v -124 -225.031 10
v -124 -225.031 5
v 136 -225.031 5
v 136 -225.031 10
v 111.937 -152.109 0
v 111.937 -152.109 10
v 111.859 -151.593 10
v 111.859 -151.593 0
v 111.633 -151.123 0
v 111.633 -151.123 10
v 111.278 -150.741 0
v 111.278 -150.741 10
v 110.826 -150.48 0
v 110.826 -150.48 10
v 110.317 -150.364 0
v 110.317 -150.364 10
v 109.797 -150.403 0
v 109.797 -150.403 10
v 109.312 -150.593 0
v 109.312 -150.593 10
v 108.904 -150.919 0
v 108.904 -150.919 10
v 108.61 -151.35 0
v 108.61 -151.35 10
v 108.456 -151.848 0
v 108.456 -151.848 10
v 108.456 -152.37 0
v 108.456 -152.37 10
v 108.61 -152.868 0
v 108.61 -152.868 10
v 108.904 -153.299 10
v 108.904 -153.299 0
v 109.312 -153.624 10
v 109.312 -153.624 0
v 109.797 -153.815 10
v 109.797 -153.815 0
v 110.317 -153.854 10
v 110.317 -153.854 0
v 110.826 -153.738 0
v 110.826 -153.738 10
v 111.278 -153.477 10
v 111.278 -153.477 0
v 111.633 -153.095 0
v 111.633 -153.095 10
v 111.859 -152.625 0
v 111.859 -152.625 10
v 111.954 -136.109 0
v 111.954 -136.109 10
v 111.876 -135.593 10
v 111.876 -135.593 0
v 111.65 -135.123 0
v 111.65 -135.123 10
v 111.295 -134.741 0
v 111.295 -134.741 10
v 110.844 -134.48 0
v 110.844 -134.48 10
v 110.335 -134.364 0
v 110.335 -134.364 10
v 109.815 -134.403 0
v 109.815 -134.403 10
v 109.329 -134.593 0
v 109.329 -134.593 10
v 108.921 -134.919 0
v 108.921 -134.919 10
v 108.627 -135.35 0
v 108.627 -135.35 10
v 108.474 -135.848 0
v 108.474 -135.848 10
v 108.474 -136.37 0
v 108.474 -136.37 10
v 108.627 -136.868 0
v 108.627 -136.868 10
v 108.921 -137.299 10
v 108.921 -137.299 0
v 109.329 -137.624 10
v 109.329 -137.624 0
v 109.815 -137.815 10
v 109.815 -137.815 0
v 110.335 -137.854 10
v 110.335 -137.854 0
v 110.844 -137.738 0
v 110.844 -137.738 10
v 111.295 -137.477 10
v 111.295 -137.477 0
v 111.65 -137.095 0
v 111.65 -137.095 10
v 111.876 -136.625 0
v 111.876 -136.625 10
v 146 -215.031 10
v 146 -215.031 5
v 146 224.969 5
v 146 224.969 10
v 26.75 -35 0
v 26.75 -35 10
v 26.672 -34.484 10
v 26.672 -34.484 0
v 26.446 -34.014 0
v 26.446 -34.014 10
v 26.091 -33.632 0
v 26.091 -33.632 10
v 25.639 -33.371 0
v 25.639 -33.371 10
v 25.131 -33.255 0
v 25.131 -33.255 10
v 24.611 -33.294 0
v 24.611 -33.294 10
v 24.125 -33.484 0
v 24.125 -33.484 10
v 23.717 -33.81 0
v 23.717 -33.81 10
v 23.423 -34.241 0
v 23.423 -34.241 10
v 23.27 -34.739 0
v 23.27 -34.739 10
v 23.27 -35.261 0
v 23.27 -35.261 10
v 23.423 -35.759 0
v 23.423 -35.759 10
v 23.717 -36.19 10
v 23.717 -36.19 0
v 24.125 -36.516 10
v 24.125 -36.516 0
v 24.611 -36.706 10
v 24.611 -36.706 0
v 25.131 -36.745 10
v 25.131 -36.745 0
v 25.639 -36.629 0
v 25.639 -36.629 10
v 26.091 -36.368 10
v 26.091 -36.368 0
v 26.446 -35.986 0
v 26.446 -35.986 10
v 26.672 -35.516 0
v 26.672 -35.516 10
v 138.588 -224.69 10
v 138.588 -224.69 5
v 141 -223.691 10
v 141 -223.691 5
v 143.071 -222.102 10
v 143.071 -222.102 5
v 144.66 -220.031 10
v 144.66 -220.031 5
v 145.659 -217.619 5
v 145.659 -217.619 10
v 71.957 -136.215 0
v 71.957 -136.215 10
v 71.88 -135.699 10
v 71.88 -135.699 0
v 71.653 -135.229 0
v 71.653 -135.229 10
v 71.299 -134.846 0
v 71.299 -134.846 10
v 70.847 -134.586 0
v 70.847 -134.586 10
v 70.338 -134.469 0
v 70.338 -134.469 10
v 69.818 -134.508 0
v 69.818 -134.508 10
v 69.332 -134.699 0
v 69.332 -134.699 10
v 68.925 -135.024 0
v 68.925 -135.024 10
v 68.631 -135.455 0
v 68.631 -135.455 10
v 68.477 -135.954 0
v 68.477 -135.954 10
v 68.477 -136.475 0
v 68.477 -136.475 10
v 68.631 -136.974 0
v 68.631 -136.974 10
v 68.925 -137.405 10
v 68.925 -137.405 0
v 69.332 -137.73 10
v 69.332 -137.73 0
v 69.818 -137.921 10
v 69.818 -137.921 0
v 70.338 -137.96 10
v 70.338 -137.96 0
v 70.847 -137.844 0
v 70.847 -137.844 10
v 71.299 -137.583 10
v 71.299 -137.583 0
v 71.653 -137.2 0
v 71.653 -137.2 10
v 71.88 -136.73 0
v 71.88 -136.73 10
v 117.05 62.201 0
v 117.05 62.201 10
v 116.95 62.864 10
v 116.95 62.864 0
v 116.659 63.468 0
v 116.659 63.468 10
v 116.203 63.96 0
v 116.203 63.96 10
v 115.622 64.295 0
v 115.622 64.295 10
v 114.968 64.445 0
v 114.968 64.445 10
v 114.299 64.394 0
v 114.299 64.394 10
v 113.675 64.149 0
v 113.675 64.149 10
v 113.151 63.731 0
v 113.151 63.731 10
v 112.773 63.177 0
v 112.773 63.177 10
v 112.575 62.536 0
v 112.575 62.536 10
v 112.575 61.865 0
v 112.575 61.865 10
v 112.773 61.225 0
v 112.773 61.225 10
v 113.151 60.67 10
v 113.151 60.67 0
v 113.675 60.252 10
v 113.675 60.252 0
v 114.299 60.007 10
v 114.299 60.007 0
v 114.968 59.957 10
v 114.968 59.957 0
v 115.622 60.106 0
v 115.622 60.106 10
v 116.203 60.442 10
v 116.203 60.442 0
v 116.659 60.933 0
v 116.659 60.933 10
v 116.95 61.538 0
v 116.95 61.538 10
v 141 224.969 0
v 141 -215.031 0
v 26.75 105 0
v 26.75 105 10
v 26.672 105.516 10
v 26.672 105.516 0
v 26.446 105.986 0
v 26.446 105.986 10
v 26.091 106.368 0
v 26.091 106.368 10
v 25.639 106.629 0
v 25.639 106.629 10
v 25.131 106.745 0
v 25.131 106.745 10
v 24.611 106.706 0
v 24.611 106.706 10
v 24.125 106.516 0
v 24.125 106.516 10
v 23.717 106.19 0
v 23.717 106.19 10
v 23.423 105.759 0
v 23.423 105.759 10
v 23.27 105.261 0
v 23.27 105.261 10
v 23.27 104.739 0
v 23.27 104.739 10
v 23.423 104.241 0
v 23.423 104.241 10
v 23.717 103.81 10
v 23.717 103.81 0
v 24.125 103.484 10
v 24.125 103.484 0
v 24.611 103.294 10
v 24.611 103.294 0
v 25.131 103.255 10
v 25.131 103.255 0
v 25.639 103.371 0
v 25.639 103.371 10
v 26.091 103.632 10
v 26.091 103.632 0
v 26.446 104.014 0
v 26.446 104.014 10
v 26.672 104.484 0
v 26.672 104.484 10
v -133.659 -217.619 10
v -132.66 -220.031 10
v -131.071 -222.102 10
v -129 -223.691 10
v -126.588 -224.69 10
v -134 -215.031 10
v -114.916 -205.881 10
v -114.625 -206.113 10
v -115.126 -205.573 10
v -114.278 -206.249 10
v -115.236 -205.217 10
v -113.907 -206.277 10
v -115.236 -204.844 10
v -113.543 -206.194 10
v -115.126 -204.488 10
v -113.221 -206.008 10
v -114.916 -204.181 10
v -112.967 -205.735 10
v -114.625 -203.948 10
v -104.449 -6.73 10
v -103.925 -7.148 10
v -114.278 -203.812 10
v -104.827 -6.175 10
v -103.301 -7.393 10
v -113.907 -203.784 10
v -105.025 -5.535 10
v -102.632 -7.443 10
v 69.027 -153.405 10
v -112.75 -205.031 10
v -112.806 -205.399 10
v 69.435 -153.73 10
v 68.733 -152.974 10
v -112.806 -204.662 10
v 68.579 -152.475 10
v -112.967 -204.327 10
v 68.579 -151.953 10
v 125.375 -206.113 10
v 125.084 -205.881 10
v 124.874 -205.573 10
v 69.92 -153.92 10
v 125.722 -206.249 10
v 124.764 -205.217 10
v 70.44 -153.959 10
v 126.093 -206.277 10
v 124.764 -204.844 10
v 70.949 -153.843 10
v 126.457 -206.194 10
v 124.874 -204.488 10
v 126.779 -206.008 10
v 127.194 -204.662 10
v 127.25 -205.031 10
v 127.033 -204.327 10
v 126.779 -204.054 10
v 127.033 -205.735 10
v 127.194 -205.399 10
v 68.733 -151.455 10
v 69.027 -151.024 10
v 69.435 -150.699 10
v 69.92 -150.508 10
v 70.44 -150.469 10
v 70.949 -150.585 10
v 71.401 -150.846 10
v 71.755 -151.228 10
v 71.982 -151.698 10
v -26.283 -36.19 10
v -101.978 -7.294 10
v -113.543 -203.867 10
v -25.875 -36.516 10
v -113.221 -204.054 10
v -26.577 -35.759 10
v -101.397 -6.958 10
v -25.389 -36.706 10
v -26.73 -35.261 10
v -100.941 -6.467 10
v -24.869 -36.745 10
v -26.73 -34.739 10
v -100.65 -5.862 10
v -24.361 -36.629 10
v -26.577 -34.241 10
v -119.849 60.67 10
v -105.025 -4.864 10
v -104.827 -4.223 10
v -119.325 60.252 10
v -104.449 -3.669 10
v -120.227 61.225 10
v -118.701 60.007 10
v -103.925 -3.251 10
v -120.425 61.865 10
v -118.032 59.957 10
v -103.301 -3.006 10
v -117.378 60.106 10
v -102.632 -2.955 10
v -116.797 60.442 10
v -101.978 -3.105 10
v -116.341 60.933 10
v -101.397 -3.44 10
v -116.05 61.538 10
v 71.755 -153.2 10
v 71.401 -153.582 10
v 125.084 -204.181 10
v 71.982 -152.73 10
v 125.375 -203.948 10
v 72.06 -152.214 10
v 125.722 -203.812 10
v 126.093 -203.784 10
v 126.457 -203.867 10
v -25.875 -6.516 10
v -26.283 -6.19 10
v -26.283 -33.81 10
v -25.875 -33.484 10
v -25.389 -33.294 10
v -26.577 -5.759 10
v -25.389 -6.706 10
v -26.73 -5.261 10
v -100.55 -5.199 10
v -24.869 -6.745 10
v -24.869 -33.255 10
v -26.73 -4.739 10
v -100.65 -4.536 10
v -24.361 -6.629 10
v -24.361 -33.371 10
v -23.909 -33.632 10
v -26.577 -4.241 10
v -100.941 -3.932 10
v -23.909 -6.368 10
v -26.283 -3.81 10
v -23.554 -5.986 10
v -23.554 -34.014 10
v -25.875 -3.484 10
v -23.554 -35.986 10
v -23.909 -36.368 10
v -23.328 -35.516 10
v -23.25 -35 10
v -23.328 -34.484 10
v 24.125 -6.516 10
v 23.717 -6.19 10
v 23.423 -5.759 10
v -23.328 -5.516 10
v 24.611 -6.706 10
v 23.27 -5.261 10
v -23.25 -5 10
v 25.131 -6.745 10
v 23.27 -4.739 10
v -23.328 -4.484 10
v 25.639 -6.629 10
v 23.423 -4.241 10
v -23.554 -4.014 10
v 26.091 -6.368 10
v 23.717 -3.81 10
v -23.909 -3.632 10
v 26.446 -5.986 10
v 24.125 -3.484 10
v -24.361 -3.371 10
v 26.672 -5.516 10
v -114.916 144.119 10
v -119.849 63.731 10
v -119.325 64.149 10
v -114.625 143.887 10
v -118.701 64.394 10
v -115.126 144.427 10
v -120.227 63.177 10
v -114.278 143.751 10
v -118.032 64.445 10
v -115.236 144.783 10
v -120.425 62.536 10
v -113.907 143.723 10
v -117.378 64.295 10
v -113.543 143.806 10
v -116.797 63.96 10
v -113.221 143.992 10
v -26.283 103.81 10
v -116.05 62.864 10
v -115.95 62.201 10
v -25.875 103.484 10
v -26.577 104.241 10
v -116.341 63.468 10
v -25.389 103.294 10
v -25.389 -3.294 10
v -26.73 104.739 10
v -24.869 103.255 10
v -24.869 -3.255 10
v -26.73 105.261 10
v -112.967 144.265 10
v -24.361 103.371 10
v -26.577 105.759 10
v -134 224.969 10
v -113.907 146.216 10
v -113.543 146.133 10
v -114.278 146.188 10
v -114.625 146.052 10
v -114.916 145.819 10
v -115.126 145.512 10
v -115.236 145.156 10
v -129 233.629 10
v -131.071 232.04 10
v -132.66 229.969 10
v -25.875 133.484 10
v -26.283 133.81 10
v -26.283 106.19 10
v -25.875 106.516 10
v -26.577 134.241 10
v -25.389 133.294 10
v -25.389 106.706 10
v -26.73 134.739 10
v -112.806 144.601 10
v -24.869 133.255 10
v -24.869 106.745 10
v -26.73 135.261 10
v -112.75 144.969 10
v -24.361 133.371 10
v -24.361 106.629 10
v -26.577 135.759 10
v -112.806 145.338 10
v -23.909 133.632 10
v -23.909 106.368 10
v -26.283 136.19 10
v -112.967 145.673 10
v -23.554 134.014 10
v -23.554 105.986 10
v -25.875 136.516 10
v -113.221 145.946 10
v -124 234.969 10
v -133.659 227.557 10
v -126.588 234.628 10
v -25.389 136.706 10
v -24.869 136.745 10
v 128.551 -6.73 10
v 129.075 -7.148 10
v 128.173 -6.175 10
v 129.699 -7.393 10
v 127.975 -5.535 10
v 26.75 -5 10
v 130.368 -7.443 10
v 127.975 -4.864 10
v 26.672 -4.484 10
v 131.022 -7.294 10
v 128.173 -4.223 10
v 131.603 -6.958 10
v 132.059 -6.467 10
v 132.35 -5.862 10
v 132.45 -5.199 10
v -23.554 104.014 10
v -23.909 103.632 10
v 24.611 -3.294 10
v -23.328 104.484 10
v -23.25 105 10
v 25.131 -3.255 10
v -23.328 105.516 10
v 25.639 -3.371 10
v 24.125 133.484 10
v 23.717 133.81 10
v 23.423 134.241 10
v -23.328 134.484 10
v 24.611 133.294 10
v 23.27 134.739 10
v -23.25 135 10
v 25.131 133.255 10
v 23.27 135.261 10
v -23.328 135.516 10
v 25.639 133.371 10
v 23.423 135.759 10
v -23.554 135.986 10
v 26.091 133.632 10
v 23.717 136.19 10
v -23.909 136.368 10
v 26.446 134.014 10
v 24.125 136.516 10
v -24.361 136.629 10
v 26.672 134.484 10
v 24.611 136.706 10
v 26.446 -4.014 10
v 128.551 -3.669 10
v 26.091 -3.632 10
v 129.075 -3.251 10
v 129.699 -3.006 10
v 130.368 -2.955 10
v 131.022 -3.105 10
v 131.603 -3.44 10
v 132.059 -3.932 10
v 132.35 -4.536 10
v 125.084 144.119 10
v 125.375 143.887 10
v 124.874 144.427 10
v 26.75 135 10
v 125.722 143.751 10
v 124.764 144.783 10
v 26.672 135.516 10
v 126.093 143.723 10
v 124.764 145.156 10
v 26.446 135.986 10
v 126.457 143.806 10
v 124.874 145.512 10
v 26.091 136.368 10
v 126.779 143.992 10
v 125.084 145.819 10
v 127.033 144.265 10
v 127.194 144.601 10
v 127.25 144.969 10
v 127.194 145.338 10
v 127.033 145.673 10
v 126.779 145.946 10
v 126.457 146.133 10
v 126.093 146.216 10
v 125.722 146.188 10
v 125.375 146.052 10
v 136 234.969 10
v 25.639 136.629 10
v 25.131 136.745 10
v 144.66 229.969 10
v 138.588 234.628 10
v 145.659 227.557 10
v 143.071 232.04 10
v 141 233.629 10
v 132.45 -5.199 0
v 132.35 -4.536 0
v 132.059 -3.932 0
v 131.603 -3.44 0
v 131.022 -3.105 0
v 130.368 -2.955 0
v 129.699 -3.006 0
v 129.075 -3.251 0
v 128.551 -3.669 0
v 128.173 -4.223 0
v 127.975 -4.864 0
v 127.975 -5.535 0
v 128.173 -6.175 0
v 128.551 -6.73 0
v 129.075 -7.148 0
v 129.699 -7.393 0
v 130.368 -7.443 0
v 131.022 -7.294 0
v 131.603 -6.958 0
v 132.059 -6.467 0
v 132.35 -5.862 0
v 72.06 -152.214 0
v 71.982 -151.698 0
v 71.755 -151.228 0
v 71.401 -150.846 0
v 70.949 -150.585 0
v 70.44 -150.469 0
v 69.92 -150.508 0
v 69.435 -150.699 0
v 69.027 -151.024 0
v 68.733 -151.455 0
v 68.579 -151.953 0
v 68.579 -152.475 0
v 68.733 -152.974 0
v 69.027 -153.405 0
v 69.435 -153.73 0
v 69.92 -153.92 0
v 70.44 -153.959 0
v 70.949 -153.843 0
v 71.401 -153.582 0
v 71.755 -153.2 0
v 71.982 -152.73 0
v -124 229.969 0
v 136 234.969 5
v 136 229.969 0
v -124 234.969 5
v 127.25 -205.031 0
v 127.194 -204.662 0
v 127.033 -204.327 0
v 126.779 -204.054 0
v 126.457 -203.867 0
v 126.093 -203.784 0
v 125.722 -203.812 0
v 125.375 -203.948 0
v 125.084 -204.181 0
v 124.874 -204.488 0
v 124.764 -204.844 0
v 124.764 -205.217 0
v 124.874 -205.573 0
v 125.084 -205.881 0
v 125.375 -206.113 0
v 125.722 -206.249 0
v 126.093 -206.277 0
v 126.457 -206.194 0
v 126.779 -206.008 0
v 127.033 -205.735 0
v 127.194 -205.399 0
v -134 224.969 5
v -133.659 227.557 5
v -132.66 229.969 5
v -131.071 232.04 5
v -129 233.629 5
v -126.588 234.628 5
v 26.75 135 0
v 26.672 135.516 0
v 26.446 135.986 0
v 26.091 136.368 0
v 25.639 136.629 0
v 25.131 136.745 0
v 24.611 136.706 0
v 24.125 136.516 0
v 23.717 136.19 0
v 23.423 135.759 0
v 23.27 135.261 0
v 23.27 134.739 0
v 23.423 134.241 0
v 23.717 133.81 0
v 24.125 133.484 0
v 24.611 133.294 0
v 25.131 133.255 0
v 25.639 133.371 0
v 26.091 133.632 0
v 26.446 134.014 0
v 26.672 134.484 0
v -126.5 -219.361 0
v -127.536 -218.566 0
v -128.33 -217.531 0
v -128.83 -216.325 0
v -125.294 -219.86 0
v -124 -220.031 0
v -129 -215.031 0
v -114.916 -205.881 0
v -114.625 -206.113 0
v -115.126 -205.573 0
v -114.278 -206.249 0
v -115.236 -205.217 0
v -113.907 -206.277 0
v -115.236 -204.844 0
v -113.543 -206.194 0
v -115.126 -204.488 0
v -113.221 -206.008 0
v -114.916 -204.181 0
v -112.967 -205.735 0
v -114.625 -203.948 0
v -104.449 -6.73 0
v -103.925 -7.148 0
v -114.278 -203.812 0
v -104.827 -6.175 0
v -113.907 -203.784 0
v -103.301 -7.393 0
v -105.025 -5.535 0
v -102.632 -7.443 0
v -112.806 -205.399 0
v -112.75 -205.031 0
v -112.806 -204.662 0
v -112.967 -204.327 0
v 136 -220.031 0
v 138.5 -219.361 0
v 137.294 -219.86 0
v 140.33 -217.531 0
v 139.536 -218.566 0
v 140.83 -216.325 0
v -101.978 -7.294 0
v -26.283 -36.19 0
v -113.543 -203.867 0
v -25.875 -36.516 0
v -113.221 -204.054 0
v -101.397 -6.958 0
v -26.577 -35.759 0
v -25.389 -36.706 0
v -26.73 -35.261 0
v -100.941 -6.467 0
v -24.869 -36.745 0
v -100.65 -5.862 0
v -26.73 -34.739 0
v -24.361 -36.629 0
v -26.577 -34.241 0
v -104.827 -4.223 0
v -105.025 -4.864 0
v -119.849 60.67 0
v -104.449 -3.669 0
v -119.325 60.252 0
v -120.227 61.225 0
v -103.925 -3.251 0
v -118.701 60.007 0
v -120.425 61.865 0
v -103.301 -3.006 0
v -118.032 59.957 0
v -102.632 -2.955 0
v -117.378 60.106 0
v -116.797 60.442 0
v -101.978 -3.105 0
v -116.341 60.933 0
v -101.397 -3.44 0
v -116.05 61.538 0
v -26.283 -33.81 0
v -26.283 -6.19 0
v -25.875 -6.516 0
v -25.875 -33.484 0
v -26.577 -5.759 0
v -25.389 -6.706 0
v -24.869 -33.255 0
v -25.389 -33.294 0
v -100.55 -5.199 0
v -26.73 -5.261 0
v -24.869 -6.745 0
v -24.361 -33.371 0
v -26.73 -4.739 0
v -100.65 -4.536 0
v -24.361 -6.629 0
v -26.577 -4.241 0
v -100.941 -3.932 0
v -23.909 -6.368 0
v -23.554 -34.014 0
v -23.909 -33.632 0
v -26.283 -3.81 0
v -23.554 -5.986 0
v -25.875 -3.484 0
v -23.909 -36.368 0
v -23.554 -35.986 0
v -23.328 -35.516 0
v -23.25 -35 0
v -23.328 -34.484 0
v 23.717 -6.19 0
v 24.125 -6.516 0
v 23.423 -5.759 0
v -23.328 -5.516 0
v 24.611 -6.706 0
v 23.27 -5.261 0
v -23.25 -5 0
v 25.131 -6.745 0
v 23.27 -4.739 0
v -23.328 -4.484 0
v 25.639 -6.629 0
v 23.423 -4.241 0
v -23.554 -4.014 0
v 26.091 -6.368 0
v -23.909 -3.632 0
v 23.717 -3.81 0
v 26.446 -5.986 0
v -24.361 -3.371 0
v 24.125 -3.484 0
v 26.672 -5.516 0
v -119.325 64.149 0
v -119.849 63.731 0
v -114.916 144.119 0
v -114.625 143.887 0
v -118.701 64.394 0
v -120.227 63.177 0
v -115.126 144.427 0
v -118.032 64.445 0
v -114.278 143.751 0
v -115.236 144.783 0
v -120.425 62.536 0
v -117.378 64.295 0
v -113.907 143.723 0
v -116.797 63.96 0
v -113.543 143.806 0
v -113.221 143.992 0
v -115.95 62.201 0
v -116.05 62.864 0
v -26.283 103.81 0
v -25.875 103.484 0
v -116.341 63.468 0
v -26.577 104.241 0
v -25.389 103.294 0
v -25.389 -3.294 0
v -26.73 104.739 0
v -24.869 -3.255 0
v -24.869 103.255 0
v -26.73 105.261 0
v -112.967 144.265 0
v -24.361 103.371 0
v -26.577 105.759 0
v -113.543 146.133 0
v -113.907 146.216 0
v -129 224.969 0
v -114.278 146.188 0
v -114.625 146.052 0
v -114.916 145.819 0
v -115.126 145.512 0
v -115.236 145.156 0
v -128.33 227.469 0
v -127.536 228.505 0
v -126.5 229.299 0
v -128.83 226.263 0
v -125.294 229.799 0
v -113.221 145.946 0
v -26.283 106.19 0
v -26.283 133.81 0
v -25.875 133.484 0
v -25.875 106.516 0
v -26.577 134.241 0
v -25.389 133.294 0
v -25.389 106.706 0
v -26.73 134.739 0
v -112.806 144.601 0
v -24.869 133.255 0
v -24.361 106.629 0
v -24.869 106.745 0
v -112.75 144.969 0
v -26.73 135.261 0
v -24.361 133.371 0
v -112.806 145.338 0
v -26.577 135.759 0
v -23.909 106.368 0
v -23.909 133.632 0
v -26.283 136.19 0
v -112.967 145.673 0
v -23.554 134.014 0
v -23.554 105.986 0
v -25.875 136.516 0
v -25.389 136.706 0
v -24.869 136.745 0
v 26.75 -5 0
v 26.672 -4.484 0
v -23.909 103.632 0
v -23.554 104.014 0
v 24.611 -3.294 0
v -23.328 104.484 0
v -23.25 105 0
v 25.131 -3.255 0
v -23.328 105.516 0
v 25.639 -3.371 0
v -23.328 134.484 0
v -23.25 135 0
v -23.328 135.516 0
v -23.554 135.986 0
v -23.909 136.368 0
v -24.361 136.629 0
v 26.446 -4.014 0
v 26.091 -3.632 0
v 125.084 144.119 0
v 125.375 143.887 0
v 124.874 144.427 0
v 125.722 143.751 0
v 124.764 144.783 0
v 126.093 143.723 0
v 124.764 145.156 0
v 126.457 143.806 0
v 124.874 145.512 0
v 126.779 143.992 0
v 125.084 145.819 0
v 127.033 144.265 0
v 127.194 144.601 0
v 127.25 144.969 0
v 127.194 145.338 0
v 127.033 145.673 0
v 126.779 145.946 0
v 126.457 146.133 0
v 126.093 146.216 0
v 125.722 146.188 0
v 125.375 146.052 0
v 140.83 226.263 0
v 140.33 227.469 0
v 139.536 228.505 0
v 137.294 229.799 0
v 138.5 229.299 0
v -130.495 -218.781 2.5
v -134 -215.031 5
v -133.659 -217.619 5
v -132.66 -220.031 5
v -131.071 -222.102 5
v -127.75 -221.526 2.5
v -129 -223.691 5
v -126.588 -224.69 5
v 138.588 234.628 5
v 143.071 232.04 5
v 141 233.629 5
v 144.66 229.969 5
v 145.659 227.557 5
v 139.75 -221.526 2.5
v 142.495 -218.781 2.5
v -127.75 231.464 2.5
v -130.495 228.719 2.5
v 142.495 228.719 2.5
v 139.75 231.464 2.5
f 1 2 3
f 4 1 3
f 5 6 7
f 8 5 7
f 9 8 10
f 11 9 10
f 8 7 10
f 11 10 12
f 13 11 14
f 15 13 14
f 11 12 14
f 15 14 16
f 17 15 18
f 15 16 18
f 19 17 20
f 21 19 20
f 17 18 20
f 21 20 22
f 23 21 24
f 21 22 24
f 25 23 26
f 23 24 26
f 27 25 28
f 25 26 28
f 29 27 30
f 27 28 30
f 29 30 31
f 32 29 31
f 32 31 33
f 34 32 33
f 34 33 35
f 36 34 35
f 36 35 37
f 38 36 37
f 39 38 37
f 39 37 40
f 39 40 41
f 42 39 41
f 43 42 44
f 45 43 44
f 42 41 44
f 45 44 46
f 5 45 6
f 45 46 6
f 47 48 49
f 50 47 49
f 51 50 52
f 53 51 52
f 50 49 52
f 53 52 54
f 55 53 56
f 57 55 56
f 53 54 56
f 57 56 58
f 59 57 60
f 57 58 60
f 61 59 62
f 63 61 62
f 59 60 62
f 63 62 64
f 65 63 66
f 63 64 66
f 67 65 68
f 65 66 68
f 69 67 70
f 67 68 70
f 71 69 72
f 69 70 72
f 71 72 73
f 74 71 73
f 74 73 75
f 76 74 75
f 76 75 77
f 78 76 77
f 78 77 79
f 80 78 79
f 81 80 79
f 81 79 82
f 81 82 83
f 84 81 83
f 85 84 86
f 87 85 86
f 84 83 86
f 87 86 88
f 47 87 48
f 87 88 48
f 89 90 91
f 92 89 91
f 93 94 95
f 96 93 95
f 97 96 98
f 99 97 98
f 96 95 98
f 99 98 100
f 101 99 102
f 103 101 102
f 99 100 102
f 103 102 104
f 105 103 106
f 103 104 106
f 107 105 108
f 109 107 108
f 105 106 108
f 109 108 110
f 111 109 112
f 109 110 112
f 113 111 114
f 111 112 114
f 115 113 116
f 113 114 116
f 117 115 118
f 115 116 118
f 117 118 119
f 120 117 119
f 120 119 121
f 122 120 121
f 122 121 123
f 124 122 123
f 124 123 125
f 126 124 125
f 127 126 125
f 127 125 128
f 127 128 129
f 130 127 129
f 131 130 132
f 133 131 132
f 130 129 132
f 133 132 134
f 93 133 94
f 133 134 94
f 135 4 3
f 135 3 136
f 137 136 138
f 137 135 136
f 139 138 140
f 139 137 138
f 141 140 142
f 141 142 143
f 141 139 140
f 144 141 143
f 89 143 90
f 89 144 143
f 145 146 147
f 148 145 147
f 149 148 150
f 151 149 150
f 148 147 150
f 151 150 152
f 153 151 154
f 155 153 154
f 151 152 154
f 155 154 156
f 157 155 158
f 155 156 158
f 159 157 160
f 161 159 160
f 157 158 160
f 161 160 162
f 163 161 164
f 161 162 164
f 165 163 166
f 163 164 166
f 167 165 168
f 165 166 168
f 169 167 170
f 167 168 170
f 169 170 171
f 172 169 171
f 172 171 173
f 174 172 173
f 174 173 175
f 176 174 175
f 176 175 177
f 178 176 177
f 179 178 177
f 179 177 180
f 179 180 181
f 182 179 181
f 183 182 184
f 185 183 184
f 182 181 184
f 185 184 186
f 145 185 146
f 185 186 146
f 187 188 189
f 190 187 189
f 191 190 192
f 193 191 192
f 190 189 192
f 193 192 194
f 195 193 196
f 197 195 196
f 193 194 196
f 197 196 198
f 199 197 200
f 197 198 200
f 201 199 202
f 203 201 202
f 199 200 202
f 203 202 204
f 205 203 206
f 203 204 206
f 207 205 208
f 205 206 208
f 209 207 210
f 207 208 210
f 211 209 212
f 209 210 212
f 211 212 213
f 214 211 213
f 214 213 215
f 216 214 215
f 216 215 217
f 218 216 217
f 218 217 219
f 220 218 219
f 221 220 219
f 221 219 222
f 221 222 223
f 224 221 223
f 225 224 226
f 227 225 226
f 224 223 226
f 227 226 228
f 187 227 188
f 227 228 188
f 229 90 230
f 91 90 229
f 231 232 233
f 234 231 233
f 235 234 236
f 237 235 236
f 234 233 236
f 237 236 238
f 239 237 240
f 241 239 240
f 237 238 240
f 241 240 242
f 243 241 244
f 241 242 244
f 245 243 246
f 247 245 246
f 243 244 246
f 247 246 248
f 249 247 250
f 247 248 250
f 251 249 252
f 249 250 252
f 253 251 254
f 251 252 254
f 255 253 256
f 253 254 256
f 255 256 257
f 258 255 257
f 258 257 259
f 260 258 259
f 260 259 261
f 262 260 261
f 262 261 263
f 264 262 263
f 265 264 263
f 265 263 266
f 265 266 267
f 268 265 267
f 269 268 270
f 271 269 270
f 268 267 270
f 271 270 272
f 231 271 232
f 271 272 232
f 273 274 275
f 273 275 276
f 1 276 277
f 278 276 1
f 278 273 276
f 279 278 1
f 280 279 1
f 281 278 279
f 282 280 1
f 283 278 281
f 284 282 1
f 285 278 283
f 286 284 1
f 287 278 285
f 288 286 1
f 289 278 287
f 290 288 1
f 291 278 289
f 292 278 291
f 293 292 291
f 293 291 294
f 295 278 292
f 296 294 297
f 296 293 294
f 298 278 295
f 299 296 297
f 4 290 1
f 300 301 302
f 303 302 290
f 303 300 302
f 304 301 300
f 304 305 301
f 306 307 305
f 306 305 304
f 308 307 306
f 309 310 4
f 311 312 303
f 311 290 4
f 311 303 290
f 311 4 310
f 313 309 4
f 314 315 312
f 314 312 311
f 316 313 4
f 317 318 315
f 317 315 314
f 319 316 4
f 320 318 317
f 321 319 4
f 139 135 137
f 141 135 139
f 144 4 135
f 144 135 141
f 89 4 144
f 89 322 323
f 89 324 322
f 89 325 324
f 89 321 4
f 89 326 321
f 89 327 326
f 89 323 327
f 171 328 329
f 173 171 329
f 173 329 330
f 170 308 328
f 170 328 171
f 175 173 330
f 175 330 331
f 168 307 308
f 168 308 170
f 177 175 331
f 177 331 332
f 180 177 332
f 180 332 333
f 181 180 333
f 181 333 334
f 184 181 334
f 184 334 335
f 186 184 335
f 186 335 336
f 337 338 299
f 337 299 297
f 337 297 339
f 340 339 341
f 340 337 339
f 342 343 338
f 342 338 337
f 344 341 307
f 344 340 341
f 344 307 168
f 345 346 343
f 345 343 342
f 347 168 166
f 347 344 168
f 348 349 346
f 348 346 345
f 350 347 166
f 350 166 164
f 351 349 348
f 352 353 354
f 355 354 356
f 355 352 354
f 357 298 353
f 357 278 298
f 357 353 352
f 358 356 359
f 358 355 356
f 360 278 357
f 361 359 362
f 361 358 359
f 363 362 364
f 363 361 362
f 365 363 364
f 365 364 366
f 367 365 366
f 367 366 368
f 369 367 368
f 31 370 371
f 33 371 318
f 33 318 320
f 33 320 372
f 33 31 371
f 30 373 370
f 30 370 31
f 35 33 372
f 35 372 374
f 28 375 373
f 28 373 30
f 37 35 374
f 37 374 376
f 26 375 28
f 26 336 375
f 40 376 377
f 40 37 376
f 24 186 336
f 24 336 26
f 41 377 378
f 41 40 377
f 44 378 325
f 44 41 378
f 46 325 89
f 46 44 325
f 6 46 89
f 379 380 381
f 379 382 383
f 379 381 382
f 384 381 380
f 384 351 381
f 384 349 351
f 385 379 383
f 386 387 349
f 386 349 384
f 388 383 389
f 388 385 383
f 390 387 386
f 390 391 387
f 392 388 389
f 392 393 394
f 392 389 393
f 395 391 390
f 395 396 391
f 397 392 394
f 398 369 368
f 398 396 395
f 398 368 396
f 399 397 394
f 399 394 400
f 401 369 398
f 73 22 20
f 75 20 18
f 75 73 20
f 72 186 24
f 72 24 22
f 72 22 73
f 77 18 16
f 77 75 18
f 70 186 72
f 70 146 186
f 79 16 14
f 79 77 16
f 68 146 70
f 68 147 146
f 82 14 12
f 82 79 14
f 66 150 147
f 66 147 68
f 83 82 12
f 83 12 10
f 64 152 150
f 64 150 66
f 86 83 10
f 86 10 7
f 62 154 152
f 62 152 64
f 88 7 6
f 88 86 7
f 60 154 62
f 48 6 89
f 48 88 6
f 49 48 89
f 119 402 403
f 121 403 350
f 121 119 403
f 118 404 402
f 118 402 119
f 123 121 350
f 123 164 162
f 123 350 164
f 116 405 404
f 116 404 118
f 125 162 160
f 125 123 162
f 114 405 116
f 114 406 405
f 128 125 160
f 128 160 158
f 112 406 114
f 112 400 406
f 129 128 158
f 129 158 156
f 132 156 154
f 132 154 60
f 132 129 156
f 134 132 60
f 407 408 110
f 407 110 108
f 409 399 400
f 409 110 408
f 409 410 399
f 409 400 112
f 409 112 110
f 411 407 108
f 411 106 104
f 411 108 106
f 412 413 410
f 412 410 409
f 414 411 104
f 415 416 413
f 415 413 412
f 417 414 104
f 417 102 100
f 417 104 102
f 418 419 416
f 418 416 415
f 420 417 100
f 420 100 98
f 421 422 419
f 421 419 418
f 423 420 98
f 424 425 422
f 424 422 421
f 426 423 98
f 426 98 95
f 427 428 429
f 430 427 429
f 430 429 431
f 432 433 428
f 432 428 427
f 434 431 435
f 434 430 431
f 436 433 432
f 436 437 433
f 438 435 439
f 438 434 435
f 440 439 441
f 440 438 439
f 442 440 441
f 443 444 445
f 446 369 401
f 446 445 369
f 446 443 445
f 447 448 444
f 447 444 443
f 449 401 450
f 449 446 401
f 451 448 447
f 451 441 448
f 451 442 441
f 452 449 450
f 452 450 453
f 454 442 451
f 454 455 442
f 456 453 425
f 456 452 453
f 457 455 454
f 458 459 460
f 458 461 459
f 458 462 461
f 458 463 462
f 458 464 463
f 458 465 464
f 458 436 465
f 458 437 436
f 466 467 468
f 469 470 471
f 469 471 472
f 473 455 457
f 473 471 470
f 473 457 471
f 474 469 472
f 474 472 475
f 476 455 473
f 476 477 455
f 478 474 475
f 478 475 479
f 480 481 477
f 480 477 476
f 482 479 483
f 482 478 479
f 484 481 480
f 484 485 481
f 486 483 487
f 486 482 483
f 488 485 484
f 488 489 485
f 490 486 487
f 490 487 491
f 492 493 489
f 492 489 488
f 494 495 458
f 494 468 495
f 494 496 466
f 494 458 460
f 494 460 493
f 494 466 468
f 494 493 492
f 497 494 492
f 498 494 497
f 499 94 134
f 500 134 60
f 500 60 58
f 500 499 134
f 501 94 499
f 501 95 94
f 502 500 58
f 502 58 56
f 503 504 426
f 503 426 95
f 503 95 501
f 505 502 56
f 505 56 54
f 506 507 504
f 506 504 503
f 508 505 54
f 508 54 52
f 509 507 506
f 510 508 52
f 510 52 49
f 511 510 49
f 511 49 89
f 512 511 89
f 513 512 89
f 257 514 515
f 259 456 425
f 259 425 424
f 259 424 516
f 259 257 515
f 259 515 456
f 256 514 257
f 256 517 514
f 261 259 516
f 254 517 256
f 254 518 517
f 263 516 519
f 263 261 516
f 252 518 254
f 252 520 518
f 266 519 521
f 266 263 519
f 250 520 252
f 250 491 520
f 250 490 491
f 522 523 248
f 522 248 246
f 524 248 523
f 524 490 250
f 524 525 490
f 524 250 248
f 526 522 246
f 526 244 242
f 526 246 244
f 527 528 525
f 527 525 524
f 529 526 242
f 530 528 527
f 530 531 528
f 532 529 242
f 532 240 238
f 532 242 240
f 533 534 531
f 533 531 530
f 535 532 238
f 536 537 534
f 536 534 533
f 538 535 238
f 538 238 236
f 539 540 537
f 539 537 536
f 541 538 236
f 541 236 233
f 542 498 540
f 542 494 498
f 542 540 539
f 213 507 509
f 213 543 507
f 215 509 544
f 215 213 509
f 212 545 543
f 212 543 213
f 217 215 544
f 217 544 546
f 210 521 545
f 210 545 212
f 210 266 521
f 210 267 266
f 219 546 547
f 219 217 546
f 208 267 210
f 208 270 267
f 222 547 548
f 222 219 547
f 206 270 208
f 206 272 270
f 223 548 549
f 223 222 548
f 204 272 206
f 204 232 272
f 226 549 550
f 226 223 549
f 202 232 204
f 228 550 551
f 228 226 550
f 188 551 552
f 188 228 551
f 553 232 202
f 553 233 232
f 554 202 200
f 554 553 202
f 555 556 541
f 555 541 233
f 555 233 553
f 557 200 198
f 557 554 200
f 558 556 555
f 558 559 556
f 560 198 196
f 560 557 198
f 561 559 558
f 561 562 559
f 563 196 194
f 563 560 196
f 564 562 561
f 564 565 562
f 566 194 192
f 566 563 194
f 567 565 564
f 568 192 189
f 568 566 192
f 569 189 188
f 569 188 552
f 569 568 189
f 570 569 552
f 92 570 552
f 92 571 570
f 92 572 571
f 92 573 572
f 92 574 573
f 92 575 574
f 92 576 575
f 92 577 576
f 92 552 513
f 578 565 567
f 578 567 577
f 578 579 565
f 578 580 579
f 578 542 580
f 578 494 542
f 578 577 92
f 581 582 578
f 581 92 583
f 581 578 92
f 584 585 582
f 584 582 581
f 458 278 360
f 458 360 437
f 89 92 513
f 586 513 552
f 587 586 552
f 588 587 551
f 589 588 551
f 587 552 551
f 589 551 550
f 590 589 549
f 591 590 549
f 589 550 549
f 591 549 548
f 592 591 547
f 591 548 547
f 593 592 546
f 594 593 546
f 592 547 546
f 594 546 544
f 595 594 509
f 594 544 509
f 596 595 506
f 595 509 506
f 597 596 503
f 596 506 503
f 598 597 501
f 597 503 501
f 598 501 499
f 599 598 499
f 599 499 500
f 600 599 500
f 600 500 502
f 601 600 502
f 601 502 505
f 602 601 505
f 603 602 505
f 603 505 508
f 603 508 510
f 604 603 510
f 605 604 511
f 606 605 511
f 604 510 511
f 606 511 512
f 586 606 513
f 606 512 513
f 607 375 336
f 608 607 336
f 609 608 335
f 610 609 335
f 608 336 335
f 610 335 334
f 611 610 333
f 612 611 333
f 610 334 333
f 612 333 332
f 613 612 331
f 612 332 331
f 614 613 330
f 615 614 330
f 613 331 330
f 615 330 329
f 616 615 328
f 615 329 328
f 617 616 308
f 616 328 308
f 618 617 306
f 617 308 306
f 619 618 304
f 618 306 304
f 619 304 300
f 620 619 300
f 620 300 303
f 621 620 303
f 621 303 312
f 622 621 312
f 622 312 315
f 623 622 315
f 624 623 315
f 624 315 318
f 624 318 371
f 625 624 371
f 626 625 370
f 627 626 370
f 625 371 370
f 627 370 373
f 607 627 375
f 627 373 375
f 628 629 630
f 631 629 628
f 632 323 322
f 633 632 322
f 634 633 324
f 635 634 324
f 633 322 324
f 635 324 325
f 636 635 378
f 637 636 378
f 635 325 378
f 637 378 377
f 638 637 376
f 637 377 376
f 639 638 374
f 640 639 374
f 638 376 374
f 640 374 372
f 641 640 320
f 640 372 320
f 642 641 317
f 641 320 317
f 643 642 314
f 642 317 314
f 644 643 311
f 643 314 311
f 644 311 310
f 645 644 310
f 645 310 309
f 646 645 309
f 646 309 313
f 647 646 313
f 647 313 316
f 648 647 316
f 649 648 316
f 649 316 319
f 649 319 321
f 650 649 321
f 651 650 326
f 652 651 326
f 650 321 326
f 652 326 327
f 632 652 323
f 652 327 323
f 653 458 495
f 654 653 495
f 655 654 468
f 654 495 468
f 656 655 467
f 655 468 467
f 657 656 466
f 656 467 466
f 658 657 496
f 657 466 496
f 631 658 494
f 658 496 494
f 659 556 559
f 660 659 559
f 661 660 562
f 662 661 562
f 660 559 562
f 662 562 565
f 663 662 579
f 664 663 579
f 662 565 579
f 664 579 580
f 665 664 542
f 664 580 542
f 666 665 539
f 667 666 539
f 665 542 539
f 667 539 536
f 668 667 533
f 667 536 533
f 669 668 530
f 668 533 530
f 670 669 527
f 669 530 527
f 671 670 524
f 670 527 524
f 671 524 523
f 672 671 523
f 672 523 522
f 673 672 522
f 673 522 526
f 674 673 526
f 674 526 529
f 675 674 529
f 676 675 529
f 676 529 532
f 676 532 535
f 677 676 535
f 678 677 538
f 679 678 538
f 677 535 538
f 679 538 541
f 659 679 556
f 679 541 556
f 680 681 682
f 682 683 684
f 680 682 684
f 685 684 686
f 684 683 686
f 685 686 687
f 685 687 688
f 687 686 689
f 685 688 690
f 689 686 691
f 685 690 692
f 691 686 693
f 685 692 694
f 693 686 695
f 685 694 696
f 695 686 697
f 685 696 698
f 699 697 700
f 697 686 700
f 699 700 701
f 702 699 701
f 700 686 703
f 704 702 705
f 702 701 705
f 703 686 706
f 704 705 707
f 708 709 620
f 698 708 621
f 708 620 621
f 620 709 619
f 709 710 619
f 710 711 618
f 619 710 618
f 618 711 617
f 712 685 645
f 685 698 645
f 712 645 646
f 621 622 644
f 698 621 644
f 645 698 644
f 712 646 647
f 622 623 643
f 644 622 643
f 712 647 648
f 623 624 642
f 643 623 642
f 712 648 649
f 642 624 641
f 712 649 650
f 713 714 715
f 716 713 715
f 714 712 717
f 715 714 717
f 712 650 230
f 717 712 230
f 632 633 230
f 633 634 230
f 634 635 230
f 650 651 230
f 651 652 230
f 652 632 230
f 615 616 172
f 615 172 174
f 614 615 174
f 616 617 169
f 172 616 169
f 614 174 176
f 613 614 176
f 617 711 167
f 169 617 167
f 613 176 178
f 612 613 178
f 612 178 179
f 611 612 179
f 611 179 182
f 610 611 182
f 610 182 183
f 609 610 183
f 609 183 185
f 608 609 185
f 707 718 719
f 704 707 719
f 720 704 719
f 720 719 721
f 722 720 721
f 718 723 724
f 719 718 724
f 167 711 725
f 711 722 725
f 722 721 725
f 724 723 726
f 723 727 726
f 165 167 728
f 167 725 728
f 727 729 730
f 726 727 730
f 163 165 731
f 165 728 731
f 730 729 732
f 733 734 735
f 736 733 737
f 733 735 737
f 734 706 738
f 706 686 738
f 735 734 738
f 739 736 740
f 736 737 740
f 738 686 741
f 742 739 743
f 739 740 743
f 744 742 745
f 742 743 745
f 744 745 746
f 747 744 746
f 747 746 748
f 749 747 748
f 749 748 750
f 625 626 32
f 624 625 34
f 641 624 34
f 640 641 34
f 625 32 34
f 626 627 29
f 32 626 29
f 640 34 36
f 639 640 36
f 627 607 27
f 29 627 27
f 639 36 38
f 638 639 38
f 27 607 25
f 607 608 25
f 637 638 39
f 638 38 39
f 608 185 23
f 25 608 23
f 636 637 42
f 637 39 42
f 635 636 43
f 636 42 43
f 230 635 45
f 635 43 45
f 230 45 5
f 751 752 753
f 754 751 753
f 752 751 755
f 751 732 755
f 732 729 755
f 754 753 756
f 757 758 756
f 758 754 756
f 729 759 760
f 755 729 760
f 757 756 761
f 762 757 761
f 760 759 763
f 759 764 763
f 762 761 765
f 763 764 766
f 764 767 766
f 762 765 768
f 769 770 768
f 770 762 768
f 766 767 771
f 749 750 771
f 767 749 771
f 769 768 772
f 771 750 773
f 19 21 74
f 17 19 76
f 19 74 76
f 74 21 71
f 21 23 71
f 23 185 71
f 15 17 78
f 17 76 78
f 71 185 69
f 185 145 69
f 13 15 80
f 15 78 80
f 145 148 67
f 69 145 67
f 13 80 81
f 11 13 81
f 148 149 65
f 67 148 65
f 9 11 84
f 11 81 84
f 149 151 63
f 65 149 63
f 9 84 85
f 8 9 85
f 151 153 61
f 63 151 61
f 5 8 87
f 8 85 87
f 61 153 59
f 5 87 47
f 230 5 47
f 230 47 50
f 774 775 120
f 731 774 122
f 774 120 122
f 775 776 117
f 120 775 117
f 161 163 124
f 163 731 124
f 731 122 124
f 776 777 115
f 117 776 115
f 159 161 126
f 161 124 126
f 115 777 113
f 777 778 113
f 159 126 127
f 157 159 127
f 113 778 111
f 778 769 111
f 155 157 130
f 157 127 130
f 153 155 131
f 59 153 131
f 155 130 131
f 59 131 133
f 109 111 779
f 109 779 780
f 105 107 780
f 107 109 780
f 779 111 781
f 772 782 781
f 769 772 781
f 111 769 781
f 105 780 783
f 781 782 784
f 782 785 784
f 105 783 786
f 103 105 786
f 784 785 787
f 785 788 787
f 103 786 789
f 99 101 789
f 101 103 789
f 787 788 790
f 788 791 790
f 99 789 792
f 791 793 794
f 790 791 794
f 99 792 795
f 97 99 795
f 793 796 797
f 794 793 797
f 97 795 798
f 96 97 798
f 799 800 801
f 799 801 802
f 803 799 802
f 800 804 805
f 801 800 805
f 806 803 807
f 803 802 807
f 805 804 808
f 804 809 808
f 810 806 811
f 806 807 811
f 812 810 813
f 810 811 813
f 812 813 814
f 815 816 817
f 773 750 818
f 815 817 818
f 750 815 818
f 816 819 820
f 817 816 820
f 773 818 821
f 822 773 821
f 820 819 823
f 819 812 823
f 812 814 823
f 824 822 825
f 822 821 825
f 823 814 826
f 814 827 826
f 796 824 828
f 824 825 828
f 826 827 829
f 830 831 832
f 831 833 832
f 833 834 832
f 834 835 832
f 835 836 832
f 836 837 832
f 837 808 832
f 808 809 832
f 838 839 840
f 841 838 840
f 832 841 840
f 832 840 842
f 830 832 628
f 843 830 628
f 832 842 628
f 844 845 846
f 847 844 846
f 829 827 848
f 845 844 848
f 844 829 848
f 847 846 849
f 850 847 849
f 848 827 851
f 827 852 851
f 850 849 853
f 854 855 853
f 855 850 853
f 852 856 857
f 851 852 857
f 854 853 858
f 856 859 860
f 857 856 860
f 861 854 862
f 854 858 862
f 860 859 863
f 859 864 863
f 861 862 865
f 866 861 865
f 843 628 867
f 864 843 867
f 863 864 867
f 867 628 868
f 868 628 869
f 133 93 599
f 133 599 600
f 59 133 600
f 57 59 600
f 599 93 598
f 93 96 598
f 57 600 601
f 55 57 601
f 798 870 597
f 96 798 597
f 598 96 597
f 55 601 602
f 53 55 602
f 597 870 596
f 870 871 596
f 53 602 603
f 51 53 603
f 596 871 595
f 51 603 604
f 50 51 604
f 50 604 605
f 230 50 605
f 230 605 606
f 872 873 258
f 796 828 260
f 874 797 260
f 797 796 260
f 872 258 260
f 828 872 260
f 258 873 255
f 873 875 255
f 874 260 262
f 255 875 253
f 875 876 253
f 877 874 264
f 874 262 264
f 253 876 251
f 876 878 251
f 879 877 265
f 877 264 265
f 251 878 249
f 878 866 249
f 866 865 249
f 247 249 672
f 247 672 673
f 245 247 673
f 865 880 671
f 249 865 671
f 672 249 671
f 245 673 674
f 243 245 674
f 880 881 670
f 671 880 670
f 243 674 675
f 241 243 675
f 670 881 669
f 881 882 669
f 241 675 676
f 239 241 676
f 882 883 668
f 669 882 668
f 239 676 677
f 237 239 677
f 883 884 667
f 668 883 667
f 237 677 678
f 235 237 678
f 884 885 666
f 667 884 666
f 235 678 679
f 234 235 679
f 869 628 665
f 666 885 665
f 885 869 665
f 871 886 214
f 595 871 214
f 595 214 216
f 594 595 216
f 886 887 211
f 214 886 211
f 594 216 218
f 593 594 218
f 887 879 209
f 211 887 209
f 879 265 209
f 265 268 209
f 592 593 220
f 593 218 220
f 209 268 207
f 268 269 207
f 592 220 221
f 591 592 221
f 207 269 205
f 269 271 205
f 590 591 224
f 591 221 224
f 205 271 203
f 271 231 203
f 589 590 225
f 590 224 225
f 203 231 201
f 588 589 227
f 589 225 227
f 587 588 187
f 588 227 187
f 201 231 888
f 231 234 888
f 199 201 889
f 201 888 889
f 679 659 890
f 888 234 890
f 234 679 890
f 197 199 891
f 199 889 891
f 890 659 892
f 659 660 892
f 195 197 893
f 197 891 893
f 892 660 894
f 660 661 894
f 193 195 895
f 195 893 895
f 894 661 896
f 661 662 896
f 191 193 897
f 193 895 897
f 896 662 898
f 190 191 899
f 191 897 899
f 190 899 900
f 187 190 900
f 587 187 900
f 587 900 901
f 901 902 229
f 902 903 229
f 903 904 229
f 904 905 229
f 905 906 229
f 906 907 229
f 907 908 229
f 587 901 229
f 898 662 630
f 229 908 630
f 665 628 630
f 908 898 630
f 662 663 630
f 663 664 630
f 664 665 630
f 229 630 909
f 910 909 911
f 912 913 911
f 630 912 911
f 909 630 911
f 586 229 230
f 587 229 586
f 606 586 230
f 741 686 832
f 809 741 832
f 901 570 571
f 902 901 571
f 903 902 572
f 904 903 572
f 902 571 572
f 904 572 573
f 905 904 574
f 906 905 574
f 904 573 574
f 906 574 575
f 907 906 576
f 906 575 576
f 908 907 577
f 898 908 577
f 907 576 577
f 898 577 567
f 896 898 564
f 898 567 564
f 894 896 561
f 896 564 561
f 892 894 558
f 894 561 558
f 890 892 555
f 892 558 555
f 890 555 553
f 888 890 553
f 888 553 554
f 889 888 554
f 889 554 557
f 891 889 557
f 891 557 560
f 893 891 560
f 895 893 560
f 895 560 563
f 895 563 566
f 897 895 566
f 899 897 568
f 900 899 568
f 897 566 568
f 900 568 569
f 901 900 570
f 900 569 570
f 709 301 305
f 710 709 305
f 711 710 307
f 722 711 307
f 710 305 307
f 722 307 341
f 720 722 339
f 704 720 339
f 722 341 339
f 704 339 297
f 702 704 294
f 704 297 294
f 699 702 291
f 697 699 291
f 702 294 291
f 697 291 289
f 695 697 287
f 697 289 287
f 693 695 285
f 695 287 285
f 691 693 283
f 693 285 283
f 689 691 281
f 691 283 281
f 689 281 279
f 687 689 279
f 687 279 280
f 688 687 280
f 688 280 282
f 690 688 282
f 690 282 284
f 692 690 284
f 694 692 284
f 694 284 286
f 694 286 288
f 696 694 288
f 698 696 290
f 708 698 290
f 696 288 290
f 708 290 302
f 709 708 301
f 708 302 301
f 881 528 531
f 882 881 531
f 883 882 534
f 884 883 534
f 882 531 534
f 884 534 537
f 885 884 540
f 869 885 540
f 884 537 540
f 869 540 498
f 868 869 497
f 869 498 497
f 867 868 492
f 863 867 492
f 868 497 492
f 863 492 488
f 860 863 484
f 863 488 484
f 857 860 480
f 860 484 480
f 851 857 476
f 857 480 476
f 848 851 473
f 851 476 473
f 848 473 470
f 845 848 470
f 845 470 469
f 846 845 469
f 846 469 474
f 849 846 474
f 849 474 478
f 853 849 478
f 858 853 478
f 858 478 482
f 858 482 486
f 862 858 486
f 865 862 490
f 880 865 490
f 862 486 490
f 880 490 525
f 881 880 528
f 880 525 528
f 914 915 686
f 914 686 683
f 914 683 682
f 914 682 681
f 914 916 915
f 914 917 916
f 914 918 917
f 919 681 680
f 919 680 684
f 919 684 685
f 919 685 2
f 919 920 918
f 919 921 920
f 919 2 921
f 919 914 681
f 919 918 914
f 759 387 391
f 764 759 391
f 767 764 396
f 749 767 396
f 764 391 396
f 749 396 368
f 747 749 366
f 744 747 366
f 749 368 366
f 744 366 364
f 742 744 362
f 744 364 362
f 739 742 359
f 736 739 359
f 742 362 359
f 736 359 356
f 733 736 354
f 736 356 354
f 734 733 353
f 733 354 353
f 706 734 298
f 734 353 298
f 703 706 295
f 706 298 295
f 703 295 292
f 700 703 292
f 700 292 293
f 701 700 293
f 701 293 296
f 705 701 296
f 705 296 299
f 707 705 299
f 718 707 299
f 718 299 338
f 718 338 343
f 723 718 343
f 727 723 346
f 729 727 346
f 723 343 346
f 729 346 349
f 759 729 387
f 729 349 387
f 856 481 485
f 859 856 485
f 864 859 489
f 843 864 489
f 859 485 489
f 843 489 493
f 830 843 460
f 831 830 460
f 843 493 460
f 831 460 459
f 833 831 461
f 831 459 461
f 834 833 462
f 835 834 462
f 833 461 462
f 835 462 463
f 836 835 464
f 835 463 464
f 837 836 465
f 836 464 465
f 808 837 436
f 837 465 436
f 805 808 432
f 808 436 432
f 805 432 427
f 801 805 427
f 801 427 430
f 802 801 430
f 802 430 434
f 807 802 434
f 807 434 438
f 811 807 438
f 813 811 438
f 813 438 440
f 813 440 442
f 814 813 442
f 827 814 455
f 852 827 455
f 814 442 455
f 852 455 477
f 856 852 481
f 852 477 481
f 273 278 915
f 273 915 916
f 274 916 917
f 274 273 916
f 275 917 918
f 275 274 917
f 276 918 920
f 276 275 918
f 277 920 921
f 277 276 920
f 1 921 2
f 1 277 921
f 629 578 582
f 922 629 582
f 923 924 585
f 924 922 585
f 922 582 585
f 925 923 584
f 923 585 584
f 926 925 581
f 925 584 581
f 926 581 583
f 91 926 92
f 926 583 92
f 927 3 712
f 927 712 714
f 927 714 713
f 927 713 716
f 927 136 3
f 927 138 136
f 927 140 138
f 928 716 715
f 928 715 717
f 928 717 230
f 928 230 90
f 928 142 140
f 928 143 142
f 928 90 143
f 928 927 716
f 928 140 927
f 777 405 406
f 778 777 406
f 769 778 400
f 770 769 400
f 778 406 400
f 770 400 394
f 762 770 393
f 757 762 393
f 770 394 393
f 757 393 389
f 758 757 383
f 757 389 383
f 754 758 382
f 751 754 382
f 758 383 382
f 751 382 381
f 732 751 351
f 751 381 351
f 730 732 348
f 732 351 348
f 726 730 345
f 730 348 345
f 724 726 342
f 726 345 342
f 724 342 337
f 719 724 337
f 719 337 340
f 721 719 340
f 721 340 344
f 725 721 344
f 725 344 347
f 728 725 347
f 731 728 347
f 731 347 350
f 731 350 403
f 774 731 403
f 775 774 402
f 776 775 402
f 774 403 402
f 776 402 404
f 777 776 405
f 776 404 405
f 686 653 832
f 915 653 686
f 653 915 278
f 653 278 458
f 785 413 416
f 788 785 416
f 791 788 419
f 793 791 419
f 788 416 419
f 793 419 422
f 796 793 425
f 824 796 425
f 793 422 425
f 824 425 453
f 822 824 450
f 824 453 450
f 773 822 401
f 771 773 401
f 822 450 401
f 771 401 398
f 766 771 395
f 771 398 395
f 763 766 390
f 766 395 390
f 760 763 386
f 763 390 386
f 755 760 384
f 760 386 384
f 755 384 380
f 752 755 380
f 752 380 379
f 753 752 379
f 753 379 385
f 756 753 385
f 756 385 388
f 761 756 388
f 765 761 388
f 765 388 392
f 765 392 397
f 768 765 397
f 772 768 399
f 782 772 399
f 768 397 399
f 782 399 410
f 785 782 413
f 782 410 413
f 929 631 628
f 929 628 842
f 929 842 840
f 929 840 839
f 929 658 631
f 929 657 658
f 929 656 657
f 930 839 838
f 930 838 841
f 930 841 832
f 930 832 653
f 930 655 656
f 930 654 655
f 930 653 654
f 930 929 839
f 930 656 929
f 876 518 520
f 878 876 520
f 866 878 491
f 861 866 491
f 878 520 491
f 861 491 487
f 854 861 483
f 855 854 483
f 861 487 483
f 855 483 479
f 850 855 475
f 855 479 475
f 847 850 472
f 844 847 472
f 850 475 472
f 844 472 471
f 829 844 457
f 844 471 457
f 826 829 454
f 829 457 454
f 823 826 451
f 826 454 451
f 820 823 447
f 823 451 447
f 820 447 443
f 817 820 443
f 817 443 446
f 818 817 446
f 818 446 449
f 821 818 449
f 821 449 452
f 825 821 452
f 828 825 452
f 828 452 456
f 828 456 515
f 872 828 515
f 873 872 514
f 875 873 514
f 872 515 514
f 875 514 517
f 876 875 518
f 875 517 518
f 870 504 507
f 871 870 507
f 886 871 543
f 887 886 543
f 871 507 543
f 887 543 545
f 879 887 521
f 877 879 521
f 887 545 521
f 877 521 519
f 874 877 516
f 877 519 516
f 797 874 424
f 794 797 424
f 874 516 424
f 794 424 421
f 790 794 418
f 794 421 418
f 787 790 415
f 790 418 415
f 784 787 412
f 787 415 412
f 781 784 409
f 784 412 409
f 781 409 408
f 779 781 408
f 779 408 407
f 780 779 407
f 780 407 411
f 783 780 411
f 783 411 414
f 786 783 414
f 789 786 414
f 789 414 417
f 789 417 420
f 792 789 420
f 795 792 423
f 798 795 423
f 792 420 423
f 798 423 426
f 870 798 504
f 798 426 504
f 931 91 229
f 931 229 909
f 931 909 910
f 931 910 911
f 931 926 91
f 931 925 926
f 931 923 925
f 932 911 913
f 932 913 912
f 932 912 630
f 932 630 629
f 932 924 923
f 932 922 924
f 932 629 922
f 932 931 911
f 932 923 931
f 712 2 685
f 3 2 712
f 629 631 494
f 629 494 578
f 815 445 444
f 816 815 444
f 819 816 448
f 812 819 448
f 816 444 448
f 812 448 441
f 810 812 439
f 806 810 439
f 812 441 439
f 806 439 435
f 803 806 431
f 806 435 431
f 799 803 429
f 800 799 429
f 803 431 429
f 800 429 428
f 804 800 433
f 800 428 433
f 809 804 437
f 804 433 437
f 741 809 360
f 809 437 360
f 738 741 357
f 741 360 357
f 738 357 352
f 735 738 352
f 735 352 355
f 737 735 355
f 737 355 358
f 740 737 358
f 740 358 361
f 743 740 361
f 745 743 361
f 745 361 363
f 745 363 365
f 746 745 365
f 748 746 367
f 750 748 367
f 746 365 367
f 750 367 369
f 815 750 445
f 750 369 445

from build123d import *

# Parameters (mm, degrees)
SKICA1_W                 = 280
SKICA1_H                 = 460
P_IDAT_VYSUNUT_M1_DEPTH  = 10
SKICA3_R                 = 1.75
SKICA3_R_2               = 2.25
ODEBRAT_VYSUNUT_M1_DEPTH = 10
SKICA4_R                 = 1.25
ODEBRAT_VYSUNUT_M2_DEPTH = 10
ZAOBLIT1_R               = 10
ZKOSEN_1_SIZE            = 5


with BuildPart() as part:
    # Skica1 → Přidat vysunutím1 (new body)
    with BuildSketch(Plane.XY):
        with Locations((6, 4.9692)):
            Rectangle(SKICA1_W, SKICA1_H)
    extrude(amount=P_IDAT_VYSUNUT_M1_DEPTH)

    # Skica3 → Odebrat vysunutím1 (cut)
    with BuildSketch(Plane.XY.offset(10)):
        with Locations((25, 135)):
            Circle(SKICA3_R)
        with Locations((25, 105)):
            Circle(SKICA3_R)
        with Locations((-25, 135)):
            Circle(SKICA3_R)
        with Locations((-25, 105)):
            Circle(SKICA3_R)
        with Locations((-102.8, -5.1992)):
            Circle(SKICA3_R_2)
        with Locations((110.186658443, -152.108914912)):
            Circle(SKICA3_R)
        with Locations((110.204187307, -136.108924514)):
            Circle(SKICA3_R)
        with Locations((70.309542186, -152.214237593)):
            Circle(SKICA3_R)
        with Locations((70.207496415, -136.214563013)):
            Circle(SKICA3_R)
        with Locations((114.8, 62.2008)):
            Circle(SKICA3_R_2)
        with Locations((130.2, -5.1992)):
            Circle(SKICA3_R_2)
        with Locations((-118.2, 62.2008)):
            Circle(SKICA3_R_2)
        with Locations((25, -5)):
            Circle(SKICA3_R)
        with Locations((25, -35)):
            Circle(SKICA3_R)
        with Locations((-25, -35)):
            Circle(SKICA3_R)
        with Locations((-25, -5)):
            Circle(SKICA3_R)
    extrude(amount=-ODEBRAT_VYSUNUT_M1_DEPTH, mode=Mode.SUBTRACT)

    # Skica4 → Odebrat vysunutím2 (cut)
    with BuildSketch(Plane.XY.offset(10)):
        with Locations((126, 144.9692)):
            Circle(SKICA4_R)
        with Locations((126, -205.0308)):
            Circle(SKICA4_R)
        with Locations((-114, -205.0308)):
            Circle(SKICA4_R)
        with Locations((-114, 144.9692)):
            Circle(SKICA4_R)
    extrude(amount=-ODEBRAT_VYSUNUT_M2_DEPTH, mode=Mode.SUBTRACT)

    # Zaoblit1
    zaoblit1_edges = [part.edges().sort_by_distance(p)[0] for p in [
        (146, -225.0308, 5),
        (-134, -225.0308, 5),
        (-134, 234.9692, 5),
        (146, 234.9692, 5),
    ]]
    fillet(zaoblit1_edges, radius=ZAOBLIT1_R)

    # Zkosení1
    zkosen_1_edges = [part.edges().sort_by_distance(p)[0] for p in [
        (6, -225.0308, 0),
        (146, 4.9692, 0),
        (-134, 4.9692, 0),
        (6, 234.9692, 0),
        (143.071067812, -222.101867812, 0),
        (143.071067812, 232.040267812, 0),
        (-131.071067812, 232.040267812, 0),
        (-131.071067812, -222.101867812, 0),
    ]]
    chamfer(zkosen_1_edges, length=ZKOSEN_1_SIZE)


solid = part.part
